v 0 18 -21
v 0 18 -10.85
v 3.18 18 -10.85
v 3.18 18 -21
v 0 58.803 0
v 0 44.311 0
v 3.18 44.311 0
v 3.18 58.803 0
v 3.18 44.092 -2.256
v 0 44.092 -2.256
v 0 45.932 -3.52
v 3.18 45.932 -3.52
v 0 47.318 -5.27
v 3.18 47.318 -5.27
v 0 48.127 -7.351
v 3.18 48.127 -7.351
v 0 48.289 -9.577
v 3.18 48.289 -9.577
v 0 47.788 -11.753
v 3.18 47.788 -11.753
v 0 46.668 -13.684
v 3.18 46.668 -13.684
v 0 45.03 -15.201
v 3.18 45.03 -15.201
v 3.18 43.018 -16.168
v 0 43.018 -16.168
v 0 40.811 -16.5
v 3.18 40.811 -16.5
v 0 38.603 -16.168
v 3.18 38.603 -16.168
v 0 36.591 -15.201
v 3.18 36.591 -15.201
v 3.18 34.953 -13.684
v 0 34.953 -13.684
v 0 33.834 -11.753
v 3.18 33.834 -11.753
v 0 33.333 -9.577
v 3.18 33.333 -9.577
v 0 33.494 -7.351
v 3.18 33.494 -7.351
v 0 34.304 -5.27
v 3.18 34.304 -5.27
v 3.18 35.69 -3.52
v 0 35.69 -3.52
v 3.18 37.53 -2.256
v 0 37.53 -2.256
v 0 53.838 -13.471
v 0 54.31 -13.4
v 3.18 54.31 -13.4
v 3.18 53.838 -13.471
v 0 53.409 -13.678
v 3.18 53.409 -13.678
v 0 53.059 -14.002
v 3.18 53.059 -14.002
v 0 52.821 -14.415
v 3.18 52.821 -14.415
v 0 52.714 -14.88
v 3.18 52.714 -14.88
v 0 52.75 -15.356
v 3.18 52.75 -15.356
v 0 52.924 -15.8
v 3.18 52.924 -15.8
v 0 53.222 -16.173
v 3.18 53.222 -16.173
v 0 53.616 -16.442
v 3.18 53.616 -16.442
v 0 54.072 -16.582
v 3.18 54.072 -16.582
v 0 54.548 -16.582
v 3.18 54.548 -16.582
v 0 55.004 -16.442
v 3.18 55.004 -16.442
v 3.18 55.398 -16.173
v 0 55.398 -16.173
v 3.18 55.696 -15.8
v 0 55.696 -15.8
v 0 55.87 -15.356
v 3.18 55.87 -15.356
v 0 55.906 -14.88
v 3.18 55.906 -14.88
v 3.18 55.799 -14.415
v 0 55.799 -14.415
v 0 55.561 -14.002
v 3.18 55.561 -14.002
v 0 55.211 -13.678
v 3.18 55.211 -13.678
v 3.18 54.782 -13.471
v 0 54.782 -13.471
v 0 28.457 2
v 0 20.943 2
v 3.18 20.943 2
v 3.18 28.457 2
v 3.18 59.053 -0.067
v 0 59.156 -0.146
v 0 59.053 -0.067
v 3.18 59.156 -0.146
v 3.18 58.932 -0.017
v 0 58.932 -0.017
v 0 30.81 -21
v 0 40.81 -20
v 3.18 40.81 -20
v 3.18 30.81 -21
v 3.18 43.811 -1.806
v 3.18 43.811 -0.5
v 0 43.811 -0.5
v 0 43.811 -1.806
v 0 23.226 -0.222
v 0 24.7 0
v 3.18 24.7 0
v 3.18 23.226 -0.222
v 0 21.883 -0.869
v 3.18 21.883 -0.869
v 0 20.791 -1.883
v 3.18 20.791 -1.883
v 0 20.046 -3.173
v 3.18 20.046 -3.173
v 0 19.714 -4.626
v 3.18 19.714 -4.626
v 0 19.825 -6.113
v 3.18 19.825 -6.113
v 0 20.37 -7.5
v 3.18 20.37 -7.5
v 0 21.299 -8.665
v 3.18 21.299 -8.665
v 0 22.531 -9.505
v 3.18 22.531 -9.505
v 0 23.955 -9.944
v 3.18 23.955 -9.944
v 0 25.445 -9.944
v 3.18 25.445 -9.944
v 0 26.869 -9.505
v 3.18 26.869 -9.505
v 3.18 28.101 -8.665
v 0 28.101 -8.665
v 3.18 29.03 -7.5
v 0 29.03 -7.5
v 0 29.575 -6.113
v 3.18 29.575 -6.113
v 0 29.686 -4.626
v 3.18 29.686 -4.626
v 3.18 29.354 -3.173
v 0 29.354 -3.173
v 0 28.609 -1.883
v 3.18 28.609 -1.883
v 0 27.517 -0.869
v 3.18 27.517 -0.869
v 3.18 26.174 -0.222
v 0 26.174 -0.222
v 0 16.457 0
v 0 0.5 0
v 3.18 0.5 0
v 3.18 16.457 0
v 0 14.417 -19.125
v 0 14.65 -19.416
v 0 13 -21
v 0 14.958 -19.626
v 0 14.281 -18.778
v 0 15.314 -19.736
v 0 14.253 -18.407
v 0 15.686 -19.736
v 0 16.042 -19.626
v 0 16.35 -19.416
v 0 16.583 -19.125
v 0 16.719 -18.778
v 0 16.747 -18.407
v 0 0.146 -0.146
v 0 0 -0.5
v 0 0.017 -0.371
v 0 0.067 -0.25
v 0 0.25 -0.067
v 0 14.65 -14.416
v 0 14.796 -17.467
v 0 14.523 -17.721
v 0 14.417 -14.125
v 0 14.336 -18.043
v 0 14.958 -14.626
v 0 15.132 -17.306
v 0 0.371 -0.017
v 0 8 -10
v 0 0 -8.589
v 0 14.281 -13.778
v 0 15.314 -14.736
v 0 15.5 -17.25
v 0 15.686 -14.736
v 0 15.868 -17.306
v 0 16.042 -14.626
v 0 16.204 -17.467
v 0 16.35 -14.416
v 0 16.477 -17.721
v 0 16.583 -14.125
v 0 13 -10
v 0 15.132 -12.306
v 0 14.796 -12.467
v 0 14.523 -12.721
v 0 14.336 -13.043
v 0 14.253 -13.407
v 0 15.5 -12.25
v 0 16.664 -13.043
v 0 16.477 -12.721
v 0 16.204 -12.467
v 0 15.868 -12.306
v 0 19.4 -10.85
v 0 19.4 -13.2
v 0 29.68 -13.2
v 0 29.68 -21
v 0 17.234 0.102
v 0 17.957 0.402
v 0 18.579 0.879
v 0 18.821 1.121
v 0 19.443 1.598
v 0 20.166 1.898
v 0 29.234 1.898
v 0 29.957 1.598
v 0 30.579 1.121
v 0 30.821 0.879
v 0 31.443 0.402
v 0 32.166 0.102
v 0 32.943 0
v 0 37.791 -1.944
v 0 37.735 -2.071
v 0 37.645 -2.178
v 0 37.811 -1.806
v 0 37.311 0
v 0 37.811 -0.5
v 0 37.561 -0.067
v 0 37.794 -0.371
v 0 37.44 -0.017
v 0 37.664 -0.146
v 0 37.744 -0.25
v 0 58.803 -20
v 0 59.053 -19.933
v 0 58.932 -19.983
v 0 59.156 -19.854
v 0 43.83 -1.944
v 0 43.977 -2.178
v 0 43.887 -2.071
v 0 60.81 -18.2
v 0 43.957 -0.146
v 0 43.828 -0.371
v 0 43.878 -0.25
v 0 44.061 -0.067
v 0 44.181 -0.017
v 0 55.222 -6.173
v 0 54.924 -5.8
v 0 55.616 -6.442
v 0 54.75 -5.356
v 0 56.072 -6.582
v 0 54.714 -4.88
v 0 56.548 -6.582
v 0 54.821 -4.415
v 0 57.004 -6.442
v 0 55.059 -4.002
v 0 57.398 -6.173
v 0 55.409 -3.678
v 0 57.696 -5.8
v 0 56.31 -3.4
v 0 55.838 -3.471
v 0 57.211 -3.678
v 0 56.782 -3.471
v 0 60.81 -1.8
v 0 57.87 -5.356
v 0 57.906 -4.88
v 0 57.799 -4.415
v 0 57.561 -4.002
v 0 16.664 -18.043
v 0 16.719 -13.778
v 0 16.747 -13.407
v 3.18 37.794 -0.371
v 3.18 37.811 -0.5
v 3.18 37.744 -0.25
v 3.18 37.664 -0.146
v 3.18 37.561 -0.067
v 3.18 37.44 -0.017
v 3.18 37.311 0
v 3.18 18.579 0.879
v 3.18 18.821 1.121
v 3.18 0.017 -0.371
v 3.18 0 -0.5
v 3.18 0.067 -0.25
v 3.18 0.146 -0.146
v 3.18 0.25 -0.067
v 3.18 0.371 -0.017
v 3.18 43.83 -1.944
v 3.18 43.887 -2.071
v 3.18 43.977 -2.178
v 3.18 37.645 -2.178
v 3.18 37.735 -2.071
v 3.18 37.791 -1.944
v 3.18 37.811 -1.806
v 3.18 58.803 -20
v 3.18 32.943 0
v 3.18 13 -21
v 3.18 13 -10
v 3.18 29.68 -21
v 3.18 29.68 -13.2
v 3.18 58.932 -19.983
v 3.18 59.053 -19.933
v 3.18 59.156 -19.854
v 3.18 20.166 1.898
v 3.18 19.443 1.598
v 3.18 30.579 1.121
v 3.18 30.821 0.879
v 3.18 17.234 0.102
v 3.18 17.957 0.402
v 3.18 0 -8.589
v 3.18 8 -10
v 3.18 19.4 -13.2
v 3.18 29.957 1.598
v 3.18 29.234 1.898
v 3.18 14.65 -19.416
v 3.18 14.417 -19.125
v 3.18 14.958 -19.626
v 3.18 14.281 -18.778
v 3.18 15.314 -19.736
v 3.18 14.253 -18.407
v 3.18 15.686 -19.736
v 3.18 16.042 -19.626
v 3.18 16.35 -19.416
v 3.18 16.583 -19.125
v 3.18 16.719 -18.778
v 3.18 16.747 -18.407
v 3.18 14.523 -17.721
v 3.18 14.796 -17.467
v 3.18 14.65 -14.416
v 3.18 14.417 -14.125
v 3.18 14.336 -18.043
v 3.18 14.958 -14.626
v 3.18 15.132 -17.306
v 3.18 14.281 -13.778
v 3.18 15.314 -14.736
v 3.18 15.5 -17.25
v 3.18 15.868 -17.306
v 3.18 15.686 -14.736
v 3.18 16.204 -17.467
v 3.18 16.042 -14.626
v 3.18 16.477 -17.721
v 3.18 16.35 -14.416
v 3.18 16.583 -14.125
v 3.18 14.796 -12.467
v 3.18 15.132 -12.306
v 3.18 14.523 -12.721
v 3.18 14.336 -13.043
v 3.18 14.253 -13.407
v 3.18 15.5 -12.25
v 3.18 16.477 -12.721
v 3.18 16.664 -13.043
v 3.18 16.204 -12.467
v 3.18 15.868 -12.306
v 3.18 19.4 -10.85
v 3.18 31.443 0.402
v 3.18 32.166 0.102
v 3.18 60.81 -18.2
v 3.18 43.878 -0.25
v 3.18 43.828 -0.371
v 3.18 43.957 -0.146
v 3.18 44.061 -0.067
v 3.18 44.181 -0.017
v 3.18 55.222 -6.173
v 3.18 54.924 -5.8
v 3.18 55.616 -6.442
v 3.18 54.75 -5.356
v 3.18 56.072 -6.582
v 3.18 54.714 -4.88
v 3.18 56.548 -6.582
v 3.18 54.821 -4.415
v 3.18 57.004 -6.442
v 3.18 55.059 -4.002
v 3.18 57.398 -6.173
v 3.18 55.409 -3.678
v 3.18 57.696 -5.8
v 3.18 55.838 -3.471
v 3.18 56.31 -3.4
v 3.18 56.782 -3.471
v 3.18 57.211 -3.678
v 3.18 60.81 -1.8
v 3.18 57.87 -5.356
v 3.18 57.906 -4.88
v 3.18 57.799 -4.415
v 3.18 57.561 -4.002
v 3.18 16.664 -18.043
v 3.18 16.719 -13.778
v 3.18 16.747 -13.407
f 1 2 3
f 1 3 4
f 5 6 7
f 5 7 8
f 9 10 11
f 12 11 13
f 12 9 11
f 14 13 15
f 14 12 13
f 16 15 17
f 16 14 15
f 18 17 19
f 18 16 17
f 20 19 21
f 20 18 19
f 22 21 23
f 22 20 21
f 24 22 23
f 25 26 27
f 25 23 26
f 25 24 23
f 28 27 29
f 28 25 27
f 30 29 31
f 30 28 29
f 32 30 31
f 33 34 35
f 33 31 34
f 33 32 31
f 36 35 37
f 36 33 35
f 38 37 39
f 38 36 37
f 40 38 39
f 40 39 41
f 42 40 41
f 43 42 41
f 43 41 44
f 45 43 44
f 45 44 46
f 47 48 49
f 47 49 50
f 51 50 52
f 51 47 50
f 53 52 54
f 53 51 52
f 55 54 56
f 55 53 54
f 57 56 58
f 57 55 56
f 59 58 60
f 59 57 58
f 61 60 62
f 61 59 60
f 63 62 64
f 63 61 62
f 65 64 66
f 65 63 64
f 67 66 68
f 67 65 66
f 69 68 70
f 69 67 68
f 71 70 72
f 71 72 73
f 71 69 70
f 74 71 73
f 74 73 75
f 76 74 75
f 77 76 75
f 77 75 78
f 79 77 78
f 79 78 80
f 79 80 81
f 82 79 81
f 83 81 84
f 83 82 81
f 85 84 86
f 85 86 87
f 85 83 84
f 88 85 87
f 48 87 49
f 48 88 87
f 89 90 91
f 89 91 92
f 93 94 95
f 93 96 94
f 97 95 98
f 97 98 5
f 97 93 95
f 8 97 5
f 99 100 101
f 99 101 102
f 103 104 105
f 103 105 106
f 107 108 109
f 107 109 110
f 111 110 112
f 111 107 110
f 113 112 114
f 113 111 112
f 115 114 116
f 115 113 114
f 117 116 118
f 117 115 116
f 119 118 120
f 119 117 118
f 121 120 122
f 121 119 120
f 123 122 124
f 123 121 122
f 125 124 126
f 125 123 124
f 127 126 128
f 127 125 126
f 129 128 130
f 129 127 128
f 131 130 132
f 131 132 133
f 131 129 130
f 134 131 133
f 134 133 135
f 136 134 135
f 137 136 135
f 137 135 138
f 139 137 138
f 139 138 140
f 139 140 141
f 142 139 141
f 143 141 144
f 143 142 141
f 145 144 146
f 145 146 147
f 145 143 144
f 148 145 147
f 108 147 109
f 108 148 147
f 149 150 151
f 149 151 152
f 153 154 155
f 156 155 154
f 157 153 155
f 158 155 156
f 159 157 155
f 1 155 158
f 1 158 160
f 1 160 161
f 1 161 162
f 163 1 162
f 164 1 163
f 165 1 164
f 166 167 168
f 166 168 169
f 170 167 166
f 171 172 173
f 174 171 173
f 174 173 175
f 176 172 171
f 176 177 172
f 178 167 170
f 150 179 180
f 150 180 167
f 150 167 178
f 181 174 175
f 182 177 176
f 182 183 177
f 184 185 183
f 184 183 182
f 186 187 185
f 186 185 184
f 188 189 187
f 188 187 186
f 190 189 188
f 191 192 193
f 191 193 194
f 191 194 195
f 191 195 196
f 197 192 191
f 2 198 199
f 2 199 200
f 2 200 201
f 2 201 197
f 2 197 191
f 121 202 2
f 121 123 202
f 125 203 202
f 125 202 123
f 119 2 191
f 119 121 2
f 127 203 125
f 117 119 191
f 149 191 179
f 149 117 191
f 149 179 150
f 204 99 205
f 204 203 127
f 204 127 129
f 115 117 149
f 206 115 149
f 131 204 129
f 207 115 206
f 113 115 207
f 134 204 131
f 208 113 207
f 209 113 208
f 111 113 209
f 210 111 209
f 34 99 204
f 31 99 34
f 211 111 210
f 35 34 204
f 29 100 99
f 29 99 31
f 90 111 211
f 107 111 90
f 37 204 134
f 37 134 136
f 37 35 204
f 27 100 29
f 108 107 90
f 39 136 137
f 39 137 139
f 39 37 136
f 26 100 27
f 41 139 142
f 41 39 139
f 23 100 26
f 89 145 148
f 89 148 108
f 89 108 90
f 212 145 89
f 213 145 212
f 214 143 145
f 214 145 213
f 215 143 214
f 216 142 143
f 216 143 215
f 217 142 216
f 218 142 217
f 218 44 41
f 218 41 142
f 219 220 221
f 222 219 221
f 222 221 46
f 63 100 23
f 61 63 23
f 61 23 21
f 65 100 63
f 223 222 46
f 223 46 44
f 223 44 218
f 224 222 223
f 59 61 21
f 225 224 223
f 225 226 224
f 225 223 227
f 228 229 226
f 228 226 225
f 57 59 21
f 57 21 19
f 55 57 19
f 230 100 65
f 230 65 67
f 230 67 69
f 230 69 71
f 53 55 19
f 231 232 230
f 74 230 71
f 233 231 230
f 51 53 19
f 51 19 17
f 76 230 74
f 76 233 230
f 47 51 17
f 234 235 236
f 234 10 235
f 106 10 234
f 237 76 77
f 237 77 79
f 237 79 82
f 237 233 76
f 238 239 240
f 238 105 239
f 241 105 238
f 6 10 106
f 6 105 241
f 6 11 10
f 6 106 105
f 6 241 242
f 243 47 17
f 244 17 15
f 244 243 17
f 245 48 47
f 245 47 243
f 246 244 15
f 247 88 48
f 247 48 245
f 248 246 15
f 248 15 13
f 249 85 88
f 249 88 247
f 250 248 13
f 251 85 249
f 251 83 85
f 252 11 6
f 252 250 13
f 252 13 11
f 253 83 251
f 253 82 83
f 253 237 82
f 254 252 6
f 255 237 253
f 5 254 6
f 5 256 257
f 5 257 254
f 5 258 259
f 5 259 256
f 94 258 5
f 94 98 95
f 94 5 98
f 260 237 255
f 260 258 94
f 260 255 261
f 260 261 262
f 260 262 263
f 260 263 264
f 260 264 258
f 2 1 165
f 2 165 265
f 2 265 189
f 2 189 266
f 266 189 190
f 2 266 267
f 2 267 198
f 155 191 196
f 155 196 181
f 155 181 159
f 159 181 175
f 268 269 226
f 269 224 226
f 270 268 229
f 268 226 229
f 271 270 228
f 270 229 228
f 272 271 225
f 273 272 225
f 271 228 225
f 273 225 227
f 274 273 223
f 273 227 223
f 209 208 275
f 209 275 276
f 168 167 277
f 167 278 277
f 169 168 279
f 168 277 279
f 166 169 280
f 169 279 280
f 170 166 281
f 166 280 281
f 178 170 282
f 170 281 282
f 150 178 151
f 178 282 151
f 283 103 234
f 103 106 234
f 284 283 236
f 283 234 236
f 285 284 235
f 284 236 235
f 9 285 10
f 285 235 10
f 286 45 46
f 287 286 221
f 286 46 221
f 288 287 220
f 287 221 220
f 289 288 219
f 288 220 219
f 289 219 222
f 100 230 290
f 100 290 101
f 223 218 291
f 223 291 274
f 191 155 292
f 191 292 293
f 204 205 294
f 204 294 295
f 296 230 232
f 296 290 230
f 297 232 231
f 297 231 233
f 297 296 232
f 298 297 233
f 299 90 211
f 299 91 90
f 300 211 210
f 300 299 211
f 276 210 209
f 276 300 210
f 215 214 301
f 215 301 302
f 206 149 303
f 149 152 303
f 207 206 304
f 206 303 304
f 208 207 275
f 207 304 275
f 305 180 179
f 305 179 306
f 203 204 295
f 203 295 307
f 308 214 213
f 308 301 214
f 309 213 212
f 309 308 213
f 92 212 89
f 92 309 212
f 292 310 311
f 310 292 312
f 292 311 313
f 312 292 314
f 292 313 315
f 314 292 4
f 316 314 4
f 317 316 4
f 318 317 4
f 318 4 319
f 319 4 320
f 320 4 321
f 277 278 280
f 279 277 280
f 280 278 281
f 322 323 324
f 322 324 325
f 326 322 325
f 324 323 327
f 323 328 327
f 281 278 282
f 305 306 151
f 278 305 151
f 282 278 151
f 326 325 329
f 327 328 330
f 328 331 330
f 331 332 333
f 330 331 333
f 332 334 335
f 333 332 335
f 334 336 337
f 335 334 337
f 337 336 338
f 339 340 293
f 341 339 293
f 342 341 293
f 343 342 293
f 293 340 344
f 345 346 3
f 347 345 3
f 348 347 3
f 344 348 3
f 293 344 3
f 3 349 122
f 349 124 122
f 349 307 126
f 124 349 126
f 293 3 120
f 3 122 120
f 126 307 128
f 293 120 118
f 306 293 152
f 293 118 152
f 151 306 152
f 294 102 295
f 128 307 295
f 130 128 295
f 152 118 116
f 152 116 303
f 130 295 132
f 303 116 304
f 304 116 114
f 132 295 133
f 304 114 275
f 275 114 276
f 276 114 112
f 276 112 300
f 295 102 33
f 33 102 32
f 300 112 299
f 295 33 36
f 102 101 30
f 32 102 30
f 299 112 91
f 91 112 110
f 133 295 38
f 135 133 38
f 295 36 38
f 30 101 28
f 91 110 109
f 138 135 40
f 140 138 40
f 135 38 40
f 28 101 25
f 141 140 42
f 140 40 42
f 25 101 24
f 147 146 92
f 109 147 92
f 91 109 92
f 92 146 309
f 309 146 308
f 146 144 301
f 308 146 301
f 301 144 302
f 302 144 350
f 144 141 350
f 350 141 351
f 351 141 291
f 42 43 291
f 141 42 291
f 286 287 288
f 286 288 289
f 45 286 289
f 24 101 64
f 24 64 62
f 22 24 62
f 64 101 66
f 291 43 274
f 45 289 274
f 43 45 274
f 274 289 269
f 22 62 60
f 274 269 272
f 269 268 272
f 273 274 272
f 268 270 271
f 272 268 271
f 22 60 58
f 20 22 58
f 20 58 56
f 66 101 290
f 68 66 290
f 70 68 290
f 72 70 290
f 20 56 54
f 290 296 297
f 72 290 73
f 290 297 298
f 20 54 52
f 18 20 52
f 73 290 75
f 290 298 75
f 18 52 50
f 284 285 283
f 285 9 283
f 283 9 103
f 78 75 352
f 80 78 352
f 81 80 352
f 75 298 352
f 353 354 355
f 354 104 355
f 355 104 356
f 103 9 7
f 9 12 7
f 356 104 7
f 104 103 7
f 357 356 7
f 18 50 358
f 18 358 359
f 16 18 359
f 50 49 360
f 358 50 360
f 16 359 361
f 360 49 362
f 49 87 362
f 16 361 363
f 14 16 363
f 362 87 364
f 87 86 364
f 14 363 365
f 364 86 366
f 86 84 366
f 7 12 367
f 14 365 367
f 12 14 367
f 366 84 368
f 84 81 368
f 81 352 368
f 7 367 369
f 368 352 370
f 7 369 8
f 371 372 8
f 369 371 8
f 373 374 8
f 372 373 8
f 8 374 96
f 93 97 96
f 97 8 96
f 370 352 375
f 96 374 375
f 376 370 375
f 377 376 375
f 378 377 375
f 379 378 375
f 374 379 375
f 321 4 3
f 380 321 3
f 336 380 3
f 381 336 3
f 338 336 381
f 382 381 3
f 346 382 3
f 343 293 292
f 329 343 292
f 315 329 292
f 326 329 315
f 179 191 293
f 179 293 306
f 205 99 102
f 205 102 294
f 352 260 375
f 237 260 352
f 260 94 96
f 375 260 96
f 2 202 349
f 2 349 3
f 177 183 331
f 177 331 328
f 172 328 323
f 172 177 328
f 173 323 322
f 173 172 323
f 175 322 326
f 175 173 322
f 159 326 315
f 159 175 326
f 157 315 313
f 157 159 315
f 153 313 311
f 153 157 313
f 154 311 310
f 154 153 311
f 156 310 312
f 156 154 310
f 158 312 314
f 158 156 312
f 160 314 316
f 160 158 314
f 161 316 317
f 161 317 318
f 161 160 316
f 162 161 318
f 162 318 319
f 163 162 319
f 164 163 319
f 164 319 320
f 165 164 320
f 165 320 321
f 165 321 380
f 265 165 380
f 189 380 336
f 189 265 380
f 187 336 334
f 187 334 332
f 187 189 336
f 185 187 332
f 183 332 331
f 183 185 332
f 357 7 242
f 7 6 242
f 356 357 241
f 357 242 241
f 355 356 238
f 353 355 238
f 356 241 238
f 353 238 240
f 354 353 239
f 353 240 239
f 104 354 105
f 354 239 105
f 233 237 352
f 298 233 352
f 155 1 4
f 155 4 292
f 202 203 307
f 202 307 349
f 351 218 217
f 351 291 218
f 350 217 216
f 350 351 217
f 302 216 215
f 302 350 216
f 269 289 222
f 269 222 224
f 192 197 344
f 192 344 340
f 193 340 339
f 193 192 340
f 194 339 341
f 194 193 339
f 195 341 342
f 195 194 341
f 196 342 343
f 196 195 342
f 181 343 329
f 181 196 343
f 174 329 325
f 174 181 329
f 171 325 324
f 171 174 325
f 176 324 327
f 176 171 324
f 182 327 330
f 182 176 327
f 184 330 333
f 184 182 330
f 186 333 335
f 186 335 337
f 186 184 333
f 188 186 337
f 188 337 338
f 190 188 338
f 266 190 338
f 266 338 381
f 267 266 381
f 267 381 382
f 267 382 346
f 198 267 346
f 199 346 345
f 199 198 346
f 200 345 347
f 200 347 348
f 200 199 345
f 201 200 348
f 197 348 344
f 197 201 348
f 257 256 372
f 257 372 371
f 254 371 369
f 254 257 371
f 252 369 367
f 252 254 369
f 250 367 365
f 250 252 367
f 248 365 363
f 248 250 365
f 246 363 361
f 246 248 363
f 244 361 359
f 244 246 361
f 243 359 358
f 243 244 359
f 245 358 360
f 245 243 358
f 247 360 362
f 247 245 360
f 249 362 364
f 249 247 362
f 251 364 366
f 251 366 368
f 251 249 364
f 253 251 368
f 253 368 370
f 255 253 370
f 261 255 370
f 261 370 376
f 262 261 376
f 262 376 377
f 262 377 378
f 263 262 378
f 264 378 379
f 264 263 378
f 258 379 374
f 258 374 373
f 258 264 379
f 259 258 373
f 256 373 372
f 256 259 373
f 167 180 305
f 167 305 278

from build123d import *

# Parameters (mm, degrees)
SKETCH1_R           = 5
SKETCH1_R_2         = 1.6
SKETCH1_R_3         = 1.25
BOSS_EXTRUDE1_DEPTH = 3.18
CHAMFER1_SIZE       = 8
CHAMFER1_SIZE2      = 1.410615846
CUT_EXTRUDE5_DEPTH  = 65.412487143
FILLET2_R           = 3
CHAMFER3_SIZE       = 1
CHAMFER3_SIZE_2     = 10
CHAMFER2_SIZE       = 1.8
FILLET4_R           = 0.5


with BuildPart() as part:
    # Sketch1 → Boss-Extrude1 (new body)
    with BuildSketch(Plane(origin=(0, 0, 0), x_dir=(0, 0, -1), z_dir=(1, 0, 0))):
        Polygon((0, 0), (0, 17.7), (-2, 19.7), (-2, 29.7), (0, 31.7), (0, 60.81), (20, 60.81), (20, 40.81), (21, 40.81), (21, 29.68), (13.2, 29.68), (13.2, 19.4), (10.85, 19.4), (10.85, 18), (21, 18), (21, 13), (10, 13), (10, 0), align=None)
        with Locations(Location((5, 24.7, 0), (0, 0, 180))):
            Circle(SKETCH1_R, mode=Mode.SUBTRACT)
        with Locations(Location((5, 56.31, 0), (0, 0, 180))):
            Circle(SKETCH1_R_2, mode=Mode.SUBTRACT)
        with Locations(Location((15, 54.31, 0), (0, 0, 180))):
            Circle(SKETCH1_R_2, mode=Mode.SUBTRACT)
        with Locations(Location((18.5, 15.5, 0), (0, 0, 180))):
            Circle(SKETCH1_R_3, mode=Mode.SUBTRACT)
        with Locations(Location((13.5, 15.5, 0), (0, 0, 180))):
            Circle(SKETCH1_R_3, mode=Mode.SUBTRACT)
    extrude(amount=BOSS_EXTRUDE1_DEPTH)

    # Chamfer1
    chamfer1_edges = [part.edges().sort_by_distance(p)[0] for p in [
        (1.59, 0, -10),
    ]]
    chamfer1_side = [part.faces().sort_by_distance(p)[0] for p in [
        (1.59, 6.5, -10),
    ]]
    chamfer(chamfer1_edges, length=CHAMFER1_SIZE, length2=CHAMFER1_SIZE2, reference=chamfer1_side[0])

    # Sketch8 → Cut-Extrude5 (cut, through all)
    with BuildSketch(Plane(origin=(3.18, 0, 0), x_dir=(0, 0, -1), z_dir=(1, 0, 0))):
        with BuildLine():
            Line((0, 43.810865899), (2.126136458, 43.810865899))
            ThreePointArc((2.126136458, 43.810865899), (16.5, 40.810865899), (2.126136458, 37.810865899))
            Line((2.126136458, 37.810865899), (0, 37.810865899))
            Line((0, 37.810865899), (0, 43.810865899))
        make_face()
    extrude(amount=-CUT_EXTRUDE5_DEPTH, mode=Mode.SUBTRACT)

    # Fillet2
    fillet2_edges = [part.edges().sort_by_distance(p)[0] for p in [
        (1.59, 17.7, 0),
        (1.59, 19.7, 2),
        (1.59, 29.7, 2),
        (1.59, 31.7, 0),
    ]]
    fillet(fillet2_edges, radius=FILLET2_R)

    # Chamfer3
    # the kernel refuses this chamfer: 10, 1 mm, written as the material it takes off along each edge
    with BuildSketch(Plane(origin=(-25.99522763, 40.81, -21), x_dir=(0, 0.3574851447578462, 0.9339188247794675), z_dir=(1, 0, 0))) as chamfer3_piece_1:
        Polygon((CHAMFER3_SIZE * 0.933918824779, CHAMFER3_SIZE * 0.357485144758), (-CHAMFER3_SIZE_2 * 0.357485144758, CHAMFER3_SIZE_2 * 0.933918824779), (0, 0), align=None)
    extrude(amount=55.170455259, mode=Mode.SUBTRACT)

    # Chamfer2
    chamfer2_edges = [part.edges().sort_by_distance(p)[0] for p in [
        (1.59, 60.81, 0),
        (1.59, 60.81, -20),
    ]]
    chamfer(chamfer2_edges, length=CHAMFER2_SIZE)

    # Fillet4
    fillet4_edges = [part.edges().sort_by_distance(p)[0] for p in [
        (1.59, 59.01, -20),
        (1.59, 59.01, 0),
        (1.59, 0, 0),
        (1.59, 37.810865899, 0),
        (1.59, 43.810865899, 0),
        (1.59, 43.810865899, -2.126136458),
        (1.59, 37.810865899, -2.126136458),
    ]]
    fillet(fillet4_edges, radius=FILLET4_R)


solid = part.part
